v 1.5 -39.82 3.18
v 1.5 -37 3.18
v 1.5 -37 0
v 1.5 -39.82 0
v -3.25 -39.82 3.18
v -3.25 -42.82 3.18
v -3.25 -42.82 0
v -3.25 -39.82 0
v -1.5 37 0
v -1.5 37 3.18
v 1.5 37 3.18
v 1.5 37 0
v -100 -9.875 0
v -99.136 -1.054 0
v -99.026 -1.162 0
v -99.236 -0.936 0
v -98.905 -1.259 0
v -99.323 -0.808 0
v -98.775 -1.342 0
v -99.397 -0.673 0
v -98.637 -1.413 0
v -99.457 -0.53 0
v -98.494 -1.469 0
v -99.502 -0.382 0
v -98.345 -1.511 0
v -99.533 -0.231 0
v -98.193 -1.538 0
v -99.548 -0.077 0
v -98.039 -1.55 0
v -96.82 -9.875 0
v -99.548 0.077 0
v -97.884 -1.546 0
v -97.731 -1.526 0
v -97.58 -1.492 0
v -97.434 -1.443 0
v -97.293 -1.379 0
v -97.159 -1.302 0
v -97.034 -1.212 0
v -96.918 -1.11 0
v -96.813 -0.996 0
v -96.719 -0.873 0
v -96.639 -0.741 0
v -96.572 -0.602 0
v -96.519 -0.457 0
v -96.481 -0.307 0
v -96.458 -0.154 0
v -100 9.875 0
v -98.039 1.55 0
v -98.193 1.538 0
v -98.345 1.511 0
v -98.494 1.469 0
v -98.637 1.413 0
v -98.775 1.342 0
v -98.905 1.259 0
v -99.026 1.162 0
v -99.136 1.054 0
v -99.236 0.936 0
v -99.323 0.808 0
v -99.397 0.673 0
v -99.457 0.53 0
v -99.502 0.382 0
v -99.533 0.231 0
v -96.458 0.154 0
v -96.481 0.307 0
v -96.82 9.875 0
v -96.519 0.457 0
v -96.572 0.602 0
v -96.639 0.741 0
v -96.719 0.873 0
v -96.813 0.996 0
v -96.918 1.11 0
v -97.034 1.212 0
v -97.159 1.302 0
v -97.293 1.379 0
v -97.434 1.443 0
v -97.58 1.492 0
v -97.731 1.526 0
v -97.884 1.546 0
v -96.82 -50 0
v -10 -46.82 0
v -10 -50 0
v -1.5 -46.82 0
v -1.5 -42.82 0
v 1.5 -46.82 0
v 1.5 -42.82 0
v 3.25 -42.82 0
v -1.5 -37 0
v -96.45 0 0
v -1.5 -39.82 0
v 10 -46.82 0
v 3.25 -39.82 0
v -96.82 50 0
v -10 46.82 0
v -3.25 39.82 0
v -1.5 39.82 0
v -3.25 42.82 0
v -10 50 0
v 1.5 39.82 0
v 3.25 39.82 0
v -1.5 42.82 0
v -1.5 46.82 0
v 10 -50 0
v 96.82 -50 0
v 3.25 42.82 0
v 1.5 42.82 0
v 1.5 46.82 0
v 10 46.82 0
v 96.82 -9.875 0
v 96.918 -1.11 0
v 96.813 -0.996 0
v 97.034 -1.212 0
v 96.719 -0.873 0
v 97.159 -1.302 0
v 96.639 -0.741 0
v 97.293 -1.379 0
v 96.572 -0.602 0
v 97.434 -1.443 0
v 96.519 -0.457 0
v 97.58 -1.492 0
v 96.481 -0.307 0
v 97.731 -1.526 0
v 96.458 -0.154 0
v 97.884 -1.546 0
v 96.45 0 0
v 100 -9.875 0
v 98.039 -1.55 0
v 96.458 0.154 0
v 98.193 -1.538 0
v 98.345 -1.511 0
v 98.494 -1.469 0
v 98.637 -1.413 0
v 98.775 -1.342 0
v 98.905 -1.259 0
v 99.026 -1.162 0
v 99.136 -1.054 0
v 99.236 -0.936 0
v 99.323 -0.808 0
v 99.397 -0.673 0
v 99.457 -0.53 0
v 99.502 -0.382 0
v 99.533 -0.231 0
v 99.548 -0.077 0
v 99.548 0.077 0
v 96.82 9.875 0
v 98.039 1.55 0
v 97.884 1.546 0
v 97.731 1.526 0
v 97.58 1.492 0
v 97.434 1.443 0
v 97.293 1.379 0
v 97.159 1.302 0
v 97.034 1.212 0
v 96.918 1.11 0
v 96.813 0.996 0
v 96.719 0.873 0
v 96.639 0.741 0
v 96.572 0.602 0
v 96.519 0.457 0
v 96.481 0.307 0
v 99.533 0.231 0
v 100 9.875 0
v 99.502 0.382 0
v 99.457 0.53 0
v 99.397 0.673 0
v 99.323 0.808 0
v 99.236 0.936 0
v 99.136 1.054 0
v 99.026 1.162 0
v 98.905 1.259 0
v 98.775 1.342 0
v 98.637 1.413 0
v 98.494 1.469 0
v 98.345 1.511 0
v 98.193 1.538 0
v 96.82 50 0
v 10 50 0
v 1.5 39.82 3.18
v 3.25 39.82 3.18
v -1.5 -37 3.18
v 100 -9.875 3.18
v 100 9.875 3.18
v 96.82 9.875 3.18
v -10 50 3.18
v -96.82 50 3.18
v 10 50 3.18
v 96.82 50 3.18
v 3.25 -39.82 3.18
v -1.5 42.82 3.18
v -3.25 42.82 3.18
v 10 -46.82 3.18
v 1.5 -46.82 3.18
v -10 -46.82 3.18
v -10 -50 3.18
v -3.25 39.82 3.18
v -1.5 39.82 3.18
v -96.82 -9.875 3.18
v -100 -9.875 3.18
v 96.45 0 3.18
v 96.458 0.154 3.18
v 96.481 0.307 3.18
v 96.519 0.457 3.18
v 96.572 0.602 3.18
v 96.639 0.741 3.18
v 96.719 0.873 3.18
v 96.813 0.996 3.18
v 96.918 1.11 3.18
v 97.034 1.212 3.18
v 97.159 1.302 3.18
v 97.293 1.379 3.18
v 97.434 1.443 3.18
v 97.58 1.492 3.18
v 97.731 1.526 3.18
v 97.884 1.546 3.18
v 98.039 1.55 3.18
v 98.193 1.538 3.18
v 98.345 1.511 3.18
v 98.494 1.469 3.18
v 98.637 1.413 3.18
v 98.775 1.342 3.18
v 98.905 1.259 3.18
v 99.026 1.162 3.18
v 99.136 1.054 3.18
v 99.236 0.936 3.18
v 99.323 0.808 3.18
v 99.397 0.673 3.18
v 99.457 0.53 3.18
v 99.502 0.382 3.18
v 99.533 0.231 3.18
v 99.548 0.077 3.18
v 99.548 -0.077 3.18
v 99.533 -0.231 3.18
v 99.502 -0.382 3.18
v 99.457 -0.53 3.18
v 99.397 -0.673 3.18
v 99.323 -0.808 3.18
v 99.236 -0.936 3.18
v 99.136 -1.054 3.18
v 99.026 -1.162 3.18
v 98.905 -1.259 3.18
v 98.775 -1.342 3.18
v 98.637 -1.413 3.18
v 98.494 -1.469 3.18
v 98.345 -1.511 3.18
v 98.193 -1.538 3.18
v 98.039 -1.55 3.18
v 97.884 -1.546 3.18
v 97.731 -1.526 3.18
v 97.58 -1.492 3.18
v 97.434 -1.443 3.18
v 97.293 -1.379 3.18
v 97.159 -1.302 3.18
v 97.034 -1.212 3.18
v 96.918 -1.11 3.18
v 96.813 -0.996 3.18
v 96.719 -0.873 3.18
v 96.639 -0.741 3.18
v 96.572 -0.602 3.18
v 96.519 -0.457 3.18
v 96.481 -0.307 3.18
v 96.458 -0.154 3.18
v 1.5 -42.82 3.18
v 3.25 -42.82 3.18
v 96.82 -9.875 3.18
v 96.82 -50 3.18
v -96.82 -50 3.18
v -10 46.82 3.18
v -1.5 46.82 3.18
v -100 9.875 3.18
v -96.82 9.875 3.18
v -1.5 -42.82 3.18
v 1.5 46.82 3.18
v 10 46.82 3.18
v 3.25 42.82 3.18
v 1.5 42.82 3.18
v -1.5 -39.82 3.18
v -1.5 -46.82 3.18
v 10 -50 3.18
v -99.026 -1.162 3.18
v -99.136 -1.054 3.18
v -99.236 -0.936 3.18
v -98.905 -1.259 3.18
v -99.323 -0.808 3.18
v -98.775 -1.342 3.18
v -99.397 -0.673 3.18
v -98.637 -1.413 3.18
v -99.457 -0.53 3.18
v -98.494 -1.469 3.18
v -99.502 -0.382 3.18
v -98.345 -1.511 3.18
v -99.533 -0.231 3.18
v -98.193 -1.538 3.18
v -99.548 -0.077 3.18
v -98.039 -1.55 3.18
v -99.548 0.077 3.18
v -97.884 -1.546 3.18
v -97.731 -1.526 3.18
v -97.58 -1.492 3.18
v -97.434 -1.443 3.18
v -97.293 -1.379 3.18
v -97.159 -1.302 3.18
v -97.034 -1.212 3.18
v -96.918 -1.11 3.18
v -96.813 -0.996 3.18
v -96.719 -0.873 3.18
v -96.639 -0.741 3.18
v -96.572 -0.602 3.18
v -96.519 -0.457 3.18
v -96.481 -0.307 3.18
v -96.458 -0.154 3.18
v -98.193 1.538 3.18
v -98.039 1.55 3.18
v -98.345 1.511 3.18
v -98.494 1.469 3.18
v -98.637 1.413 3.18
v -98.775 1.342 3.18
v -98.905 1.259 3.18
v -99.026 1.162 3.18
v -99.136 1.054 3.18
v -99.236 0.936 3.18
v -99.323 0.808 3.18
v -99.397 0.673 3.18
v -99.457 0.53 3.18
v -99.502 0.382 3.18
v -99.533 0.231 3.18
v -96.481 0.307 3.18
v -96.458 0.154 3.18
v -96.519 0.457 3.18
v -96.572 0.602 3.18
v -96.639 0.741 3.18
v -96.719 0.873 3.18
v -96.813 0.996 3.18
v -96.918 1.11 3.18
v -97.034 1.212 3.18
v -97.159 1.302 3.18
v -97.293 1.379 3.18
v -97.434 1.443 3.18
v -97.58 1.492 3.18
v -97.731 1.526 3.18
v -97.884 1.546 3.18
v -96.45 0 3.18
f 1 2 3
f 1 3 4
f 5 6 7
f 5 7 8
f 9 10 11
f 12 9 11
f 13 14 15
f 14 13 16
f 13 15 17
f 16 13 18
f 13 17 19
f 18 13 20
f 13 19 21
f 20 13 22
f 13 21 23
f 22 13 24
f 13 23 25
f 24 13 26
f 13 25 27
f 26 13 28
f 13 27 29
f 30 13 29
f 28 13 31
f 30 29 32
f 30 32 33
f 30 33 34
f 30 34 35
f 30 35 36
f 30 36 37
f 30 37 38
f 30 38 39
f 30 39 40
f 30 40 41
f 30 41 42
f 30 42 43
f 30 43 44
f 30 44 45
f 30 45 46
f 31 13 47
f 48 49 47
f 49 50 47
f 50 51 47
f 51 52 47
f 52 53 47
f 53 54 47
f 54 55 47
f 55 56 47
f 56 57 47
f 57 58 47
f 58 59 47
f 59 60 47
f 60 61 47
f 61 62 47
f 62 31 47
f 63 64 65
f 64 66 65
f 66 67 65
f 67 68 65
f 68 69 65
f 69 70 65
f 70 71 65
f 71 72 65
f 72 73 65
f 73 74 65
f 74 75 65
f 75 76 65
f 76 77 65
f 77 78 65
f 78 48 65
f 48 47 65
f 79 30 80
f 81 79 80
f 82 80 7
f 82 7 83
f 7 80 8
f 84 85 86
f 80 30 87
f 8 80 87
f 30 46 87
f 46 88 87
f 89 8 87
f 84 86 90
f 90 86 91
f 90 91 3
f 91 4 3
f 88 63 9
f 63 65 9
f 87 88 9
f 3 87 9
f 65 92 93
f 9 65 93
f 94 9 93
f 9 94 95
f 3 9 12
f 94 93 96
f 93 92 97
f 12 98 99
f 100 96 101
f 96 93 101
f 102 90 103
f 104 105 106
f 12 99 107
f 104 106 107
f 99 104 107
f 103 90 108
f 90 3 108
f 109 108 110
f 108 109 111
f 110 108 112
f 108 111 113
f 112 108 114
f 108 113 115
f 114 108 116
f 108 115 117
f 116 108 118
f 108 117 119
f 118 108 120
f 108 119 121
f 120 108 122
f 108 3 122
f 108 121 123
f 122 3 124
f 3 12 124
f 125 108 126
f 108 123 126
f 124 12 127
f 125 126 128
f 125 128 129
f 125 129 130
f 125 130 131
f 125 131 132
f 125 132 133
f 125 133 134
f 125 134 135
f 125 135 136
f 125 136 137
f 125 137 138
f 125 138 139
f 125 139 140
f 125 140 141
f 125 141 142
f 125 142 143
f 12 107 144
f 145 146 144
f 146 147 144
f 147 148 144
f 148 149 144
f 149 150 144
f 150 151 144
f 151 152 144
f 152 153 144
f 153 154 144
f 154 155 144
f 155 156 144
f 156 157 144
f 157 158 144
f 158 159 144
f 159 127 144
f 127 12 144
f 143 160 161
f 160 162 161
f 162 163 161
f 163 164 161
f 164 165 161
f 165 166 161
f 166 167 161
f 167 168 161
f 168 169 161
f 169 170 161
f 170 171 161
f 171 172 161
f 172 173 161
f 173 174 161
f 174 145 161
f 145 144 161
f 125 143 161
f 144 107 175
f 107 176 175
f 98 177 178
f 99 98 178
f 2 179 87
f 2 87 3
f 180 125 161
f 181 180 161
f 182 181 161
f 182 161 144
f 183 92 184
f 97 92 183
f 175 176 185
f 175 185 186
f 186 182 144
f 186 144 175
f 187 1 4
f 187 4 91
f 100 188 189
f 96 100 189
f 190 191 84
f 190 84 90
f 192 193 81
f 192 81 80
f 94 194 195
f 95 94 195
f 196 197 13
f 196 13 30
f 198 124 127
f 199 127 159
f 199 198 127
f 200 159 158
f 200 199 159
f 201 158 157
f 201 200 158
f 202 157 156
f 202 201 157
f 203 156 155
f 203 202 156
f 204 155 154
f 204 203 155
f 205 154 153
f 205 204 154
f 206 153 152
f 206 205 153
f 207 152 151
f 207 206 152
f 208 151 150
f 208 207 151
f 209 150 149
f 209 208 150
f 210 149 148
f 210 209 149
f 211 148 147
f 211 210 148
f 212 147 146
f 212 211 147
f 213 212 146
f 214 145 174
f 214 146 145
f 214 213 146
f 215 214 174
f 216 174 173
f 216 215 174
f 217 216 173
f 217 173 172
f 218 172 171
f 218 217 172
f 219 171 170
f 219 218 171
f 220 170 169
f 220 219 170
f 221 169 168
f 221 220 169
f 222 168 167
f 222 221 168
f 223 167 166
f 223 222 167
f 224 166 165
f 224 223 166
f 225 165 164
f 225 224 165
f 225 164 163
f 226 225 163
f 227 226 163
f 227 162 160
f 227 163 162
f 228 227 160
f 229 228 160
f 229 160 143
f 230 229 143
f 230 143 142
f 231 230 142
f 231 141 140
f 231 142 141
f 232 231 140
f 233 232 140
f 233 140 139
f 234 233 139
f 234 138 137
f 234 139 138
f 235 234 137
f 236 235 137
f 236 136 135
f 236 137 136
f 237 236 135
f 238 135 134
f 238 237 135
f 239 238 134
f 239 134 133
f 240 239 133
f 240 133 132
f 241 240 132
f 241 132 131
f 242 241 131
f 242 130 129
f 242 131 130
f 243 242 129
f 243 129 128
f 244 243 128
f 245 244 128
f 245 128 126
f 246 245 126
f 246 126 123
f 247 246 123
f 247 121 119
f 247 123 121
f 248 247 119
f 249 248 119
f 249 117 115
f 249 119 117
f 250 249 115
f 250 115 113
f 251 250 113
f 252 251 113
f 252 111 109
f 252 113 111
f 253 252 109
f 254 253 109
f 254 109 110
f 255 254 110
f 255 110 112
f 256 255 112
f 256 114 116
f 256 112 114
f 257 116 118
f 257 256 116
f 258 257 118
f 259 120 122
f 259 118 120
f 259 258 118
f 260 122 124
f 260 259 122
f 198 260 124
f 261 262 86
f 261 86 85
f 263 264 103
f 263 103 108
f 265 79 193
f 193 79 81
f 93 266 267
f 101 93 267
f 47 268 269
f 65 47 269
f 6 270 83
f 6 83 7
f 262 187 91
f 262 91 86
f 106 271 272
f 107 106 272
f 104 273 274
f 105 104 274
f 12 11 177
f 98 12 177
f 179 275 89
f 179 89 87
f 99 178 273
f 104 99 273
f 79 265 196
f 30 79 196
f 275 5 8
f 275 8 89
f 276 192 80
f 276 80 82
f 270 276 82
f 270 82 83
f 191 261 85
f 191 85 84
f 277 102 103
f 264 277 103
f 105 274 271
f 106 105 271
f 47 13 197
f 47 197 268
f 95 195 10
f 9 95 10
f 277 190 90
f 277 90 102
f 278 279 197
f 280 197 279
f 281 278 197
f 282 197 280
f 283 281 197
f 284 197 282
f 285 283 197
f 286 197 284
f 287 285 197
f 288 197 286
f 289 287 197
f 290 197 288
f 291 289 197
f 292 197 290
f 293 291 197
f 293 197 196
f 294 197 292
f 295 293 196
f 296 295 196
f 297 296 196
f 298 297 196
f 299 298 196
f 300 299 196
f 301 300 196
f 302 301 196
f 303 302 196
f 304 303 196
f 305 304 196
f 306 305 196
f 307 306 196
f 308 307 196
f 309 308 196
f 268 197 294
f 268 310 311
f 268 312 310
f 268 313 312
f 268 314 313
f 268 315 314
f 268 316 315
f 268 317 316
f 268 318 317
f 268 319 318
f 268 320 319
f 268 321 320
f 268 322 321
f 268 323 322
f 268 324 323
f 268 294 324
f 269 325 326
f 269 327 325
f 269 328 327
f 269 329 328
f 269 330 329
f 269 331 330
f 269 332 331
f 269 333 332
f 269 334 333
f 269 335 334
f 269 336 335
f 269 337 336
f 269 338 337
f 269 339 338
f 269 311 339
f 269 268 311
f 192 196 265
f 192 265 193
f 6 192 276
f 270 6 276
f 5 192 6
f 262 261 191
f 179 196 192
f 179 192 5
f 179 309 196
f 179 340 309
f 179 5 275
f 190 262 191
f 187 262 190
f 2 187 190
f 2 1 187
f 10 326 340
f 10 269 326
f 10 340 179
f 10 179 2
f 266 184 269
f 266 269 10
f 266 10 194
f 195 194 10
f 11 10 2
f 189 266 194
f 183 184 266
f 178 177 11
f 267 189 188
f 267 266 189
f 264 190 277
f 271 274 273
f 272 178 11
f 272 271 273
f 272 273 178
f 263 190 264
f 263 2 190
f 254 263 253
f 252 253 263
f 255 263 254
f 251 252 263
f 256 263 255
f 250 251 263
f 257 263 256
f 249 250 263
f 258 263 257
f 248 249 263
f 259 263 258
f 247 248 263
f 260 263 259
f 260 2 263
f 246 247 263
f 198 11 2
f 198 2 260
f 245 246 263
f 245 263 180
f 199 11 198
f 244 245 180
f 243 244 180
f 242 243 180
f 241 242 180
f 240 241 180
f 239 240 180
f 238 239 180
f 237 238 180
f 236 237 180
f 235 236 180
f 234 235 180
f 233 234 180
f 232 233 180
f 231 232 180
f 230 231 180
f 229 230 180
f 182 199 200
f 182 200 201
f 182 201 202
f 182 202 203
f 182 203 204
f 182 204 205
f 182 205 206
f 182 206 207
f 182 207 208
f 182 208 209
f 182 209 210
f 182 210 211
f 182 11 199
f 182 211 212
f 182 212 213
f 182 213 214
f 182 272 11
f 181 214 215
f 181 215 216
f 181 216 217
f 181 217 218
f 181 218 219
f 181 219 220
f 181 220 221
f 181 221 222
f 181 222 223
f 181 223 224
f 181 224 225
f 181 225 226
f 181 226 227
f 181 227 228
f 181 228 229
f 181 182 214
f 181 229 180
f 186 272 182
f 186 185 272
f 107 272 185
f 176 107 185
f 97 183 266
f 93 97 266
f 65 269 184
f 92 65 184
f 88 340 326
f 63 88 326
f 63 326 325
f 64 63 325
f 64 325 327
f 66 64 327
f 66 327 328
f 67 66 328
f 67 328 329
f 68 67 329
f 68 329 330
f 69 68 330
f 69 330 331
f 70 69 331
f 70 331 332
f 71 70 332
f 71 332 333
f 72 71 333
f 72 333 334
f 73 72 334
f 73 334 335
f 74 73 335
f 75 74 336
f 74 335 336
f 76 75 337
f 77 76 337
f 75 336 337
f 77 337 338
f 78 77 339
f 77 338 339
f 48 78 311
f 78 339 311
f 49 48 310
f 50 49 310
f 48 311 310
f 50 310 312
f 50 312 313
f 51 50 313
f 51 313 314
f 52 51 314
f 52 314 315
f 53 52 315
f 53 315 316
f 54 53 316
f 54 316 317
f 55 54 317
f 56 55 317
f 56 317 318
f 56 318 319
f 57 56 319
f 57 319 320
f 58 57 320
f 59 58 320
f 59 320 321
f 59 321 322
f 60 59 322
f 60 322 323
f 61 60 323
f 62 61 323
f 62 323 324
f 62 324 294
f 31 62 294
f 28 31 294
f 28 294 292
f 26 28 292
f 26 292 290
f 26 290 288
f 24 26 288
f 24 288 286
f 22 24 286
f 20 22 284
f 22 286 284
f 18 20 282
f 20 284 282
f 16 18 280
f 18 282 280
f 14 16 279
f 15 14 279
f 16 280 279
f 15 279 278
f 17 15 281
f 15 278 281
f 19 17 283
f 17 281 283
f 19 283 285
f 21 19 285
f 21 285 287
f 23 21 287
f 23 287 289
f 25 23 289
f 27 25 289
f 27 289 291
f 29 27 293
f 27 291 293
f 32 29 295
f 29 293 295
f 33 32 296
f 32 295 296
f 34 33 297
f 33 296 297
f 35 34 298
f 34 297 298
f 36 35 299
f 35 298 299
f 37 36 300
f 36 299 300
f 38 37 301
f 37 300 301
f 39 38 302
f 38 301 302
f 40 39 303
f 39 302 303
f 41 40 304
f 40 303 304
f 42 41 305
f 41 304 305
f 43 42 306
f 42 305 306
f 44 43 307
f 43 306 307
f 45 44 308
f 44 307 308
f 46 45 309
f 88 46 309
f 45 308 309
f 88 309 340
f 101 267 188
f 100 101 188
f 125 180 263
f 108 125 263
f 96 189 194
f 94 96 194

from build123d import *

# Parameters (mm, degrees)
SKETCH1_W           = 200
SKETCH1_H           = 100
BOSS_EXTRUDE2_DEPTH = 3.18
SKETCH2_R           = 1.55
SKETCH2_W           = 3.18
SKETCH2_H           = 40.125
CUT_EXTRUDE1_DEPTH  = 4.18


with BuildPart() as part:
    # Sketch1 → Boss-Extrude2 (new body)
    with BuildSketch(Plane.XY):
        Rectangle(SKETCH1_W, SKETCH1_H)
    extrude(amount=BOSS_EXTRUDE2_DEPTH)

    # Sketch2 → Cut-Extrude1 (cut, through all)
    with BuildSketch(Plane.XY.offset(3.18)):
        with Locations((-98, 0)):
            Circle(SKETCH2_R)
        Polygon((-10, 50), (-10, 46.82), (-1.5, 46.82), (-1.5, 42.82), (-3.25, 42.82), (-3.25, 39.82), (-1.5, 39.82), (-1.5, 37), (1.5, 37), (1.5, 39.82), (3.25, 39.82), (3.25, 42.82), (1.5, 42.82), (1.5, 46.82), (10, 46.82), (10, 50), align=None)
        with Locations((-98.41, 29.9375)):
            Rectangle(SKETCH2_W, SKETCH2_H)
        with Locations((-98.41, -29.9375)):
            Rectangle(SKETCH2_W, SKETCH2_H)
    cut_extrude1 = extrude(amount=-CUT_EXTRUDE1_DEPTH, mode=Mode.SUBTRACT)

    # Mirror1: Cut-Extrude1 across plane
    add(cut_extrude1.mirror(Plane.ZX), mode=Mode.SUBTRACT)

    # Mirror2: Cut-Extrude1 across plane
    add(cut_extrude1.mirror(Plane(origin=(0, 0, 0), x_dir=(0, 0, 1), z_dir=(1, 0, 0))), mode=Mode.SUBTRACT)


solid = part.part
